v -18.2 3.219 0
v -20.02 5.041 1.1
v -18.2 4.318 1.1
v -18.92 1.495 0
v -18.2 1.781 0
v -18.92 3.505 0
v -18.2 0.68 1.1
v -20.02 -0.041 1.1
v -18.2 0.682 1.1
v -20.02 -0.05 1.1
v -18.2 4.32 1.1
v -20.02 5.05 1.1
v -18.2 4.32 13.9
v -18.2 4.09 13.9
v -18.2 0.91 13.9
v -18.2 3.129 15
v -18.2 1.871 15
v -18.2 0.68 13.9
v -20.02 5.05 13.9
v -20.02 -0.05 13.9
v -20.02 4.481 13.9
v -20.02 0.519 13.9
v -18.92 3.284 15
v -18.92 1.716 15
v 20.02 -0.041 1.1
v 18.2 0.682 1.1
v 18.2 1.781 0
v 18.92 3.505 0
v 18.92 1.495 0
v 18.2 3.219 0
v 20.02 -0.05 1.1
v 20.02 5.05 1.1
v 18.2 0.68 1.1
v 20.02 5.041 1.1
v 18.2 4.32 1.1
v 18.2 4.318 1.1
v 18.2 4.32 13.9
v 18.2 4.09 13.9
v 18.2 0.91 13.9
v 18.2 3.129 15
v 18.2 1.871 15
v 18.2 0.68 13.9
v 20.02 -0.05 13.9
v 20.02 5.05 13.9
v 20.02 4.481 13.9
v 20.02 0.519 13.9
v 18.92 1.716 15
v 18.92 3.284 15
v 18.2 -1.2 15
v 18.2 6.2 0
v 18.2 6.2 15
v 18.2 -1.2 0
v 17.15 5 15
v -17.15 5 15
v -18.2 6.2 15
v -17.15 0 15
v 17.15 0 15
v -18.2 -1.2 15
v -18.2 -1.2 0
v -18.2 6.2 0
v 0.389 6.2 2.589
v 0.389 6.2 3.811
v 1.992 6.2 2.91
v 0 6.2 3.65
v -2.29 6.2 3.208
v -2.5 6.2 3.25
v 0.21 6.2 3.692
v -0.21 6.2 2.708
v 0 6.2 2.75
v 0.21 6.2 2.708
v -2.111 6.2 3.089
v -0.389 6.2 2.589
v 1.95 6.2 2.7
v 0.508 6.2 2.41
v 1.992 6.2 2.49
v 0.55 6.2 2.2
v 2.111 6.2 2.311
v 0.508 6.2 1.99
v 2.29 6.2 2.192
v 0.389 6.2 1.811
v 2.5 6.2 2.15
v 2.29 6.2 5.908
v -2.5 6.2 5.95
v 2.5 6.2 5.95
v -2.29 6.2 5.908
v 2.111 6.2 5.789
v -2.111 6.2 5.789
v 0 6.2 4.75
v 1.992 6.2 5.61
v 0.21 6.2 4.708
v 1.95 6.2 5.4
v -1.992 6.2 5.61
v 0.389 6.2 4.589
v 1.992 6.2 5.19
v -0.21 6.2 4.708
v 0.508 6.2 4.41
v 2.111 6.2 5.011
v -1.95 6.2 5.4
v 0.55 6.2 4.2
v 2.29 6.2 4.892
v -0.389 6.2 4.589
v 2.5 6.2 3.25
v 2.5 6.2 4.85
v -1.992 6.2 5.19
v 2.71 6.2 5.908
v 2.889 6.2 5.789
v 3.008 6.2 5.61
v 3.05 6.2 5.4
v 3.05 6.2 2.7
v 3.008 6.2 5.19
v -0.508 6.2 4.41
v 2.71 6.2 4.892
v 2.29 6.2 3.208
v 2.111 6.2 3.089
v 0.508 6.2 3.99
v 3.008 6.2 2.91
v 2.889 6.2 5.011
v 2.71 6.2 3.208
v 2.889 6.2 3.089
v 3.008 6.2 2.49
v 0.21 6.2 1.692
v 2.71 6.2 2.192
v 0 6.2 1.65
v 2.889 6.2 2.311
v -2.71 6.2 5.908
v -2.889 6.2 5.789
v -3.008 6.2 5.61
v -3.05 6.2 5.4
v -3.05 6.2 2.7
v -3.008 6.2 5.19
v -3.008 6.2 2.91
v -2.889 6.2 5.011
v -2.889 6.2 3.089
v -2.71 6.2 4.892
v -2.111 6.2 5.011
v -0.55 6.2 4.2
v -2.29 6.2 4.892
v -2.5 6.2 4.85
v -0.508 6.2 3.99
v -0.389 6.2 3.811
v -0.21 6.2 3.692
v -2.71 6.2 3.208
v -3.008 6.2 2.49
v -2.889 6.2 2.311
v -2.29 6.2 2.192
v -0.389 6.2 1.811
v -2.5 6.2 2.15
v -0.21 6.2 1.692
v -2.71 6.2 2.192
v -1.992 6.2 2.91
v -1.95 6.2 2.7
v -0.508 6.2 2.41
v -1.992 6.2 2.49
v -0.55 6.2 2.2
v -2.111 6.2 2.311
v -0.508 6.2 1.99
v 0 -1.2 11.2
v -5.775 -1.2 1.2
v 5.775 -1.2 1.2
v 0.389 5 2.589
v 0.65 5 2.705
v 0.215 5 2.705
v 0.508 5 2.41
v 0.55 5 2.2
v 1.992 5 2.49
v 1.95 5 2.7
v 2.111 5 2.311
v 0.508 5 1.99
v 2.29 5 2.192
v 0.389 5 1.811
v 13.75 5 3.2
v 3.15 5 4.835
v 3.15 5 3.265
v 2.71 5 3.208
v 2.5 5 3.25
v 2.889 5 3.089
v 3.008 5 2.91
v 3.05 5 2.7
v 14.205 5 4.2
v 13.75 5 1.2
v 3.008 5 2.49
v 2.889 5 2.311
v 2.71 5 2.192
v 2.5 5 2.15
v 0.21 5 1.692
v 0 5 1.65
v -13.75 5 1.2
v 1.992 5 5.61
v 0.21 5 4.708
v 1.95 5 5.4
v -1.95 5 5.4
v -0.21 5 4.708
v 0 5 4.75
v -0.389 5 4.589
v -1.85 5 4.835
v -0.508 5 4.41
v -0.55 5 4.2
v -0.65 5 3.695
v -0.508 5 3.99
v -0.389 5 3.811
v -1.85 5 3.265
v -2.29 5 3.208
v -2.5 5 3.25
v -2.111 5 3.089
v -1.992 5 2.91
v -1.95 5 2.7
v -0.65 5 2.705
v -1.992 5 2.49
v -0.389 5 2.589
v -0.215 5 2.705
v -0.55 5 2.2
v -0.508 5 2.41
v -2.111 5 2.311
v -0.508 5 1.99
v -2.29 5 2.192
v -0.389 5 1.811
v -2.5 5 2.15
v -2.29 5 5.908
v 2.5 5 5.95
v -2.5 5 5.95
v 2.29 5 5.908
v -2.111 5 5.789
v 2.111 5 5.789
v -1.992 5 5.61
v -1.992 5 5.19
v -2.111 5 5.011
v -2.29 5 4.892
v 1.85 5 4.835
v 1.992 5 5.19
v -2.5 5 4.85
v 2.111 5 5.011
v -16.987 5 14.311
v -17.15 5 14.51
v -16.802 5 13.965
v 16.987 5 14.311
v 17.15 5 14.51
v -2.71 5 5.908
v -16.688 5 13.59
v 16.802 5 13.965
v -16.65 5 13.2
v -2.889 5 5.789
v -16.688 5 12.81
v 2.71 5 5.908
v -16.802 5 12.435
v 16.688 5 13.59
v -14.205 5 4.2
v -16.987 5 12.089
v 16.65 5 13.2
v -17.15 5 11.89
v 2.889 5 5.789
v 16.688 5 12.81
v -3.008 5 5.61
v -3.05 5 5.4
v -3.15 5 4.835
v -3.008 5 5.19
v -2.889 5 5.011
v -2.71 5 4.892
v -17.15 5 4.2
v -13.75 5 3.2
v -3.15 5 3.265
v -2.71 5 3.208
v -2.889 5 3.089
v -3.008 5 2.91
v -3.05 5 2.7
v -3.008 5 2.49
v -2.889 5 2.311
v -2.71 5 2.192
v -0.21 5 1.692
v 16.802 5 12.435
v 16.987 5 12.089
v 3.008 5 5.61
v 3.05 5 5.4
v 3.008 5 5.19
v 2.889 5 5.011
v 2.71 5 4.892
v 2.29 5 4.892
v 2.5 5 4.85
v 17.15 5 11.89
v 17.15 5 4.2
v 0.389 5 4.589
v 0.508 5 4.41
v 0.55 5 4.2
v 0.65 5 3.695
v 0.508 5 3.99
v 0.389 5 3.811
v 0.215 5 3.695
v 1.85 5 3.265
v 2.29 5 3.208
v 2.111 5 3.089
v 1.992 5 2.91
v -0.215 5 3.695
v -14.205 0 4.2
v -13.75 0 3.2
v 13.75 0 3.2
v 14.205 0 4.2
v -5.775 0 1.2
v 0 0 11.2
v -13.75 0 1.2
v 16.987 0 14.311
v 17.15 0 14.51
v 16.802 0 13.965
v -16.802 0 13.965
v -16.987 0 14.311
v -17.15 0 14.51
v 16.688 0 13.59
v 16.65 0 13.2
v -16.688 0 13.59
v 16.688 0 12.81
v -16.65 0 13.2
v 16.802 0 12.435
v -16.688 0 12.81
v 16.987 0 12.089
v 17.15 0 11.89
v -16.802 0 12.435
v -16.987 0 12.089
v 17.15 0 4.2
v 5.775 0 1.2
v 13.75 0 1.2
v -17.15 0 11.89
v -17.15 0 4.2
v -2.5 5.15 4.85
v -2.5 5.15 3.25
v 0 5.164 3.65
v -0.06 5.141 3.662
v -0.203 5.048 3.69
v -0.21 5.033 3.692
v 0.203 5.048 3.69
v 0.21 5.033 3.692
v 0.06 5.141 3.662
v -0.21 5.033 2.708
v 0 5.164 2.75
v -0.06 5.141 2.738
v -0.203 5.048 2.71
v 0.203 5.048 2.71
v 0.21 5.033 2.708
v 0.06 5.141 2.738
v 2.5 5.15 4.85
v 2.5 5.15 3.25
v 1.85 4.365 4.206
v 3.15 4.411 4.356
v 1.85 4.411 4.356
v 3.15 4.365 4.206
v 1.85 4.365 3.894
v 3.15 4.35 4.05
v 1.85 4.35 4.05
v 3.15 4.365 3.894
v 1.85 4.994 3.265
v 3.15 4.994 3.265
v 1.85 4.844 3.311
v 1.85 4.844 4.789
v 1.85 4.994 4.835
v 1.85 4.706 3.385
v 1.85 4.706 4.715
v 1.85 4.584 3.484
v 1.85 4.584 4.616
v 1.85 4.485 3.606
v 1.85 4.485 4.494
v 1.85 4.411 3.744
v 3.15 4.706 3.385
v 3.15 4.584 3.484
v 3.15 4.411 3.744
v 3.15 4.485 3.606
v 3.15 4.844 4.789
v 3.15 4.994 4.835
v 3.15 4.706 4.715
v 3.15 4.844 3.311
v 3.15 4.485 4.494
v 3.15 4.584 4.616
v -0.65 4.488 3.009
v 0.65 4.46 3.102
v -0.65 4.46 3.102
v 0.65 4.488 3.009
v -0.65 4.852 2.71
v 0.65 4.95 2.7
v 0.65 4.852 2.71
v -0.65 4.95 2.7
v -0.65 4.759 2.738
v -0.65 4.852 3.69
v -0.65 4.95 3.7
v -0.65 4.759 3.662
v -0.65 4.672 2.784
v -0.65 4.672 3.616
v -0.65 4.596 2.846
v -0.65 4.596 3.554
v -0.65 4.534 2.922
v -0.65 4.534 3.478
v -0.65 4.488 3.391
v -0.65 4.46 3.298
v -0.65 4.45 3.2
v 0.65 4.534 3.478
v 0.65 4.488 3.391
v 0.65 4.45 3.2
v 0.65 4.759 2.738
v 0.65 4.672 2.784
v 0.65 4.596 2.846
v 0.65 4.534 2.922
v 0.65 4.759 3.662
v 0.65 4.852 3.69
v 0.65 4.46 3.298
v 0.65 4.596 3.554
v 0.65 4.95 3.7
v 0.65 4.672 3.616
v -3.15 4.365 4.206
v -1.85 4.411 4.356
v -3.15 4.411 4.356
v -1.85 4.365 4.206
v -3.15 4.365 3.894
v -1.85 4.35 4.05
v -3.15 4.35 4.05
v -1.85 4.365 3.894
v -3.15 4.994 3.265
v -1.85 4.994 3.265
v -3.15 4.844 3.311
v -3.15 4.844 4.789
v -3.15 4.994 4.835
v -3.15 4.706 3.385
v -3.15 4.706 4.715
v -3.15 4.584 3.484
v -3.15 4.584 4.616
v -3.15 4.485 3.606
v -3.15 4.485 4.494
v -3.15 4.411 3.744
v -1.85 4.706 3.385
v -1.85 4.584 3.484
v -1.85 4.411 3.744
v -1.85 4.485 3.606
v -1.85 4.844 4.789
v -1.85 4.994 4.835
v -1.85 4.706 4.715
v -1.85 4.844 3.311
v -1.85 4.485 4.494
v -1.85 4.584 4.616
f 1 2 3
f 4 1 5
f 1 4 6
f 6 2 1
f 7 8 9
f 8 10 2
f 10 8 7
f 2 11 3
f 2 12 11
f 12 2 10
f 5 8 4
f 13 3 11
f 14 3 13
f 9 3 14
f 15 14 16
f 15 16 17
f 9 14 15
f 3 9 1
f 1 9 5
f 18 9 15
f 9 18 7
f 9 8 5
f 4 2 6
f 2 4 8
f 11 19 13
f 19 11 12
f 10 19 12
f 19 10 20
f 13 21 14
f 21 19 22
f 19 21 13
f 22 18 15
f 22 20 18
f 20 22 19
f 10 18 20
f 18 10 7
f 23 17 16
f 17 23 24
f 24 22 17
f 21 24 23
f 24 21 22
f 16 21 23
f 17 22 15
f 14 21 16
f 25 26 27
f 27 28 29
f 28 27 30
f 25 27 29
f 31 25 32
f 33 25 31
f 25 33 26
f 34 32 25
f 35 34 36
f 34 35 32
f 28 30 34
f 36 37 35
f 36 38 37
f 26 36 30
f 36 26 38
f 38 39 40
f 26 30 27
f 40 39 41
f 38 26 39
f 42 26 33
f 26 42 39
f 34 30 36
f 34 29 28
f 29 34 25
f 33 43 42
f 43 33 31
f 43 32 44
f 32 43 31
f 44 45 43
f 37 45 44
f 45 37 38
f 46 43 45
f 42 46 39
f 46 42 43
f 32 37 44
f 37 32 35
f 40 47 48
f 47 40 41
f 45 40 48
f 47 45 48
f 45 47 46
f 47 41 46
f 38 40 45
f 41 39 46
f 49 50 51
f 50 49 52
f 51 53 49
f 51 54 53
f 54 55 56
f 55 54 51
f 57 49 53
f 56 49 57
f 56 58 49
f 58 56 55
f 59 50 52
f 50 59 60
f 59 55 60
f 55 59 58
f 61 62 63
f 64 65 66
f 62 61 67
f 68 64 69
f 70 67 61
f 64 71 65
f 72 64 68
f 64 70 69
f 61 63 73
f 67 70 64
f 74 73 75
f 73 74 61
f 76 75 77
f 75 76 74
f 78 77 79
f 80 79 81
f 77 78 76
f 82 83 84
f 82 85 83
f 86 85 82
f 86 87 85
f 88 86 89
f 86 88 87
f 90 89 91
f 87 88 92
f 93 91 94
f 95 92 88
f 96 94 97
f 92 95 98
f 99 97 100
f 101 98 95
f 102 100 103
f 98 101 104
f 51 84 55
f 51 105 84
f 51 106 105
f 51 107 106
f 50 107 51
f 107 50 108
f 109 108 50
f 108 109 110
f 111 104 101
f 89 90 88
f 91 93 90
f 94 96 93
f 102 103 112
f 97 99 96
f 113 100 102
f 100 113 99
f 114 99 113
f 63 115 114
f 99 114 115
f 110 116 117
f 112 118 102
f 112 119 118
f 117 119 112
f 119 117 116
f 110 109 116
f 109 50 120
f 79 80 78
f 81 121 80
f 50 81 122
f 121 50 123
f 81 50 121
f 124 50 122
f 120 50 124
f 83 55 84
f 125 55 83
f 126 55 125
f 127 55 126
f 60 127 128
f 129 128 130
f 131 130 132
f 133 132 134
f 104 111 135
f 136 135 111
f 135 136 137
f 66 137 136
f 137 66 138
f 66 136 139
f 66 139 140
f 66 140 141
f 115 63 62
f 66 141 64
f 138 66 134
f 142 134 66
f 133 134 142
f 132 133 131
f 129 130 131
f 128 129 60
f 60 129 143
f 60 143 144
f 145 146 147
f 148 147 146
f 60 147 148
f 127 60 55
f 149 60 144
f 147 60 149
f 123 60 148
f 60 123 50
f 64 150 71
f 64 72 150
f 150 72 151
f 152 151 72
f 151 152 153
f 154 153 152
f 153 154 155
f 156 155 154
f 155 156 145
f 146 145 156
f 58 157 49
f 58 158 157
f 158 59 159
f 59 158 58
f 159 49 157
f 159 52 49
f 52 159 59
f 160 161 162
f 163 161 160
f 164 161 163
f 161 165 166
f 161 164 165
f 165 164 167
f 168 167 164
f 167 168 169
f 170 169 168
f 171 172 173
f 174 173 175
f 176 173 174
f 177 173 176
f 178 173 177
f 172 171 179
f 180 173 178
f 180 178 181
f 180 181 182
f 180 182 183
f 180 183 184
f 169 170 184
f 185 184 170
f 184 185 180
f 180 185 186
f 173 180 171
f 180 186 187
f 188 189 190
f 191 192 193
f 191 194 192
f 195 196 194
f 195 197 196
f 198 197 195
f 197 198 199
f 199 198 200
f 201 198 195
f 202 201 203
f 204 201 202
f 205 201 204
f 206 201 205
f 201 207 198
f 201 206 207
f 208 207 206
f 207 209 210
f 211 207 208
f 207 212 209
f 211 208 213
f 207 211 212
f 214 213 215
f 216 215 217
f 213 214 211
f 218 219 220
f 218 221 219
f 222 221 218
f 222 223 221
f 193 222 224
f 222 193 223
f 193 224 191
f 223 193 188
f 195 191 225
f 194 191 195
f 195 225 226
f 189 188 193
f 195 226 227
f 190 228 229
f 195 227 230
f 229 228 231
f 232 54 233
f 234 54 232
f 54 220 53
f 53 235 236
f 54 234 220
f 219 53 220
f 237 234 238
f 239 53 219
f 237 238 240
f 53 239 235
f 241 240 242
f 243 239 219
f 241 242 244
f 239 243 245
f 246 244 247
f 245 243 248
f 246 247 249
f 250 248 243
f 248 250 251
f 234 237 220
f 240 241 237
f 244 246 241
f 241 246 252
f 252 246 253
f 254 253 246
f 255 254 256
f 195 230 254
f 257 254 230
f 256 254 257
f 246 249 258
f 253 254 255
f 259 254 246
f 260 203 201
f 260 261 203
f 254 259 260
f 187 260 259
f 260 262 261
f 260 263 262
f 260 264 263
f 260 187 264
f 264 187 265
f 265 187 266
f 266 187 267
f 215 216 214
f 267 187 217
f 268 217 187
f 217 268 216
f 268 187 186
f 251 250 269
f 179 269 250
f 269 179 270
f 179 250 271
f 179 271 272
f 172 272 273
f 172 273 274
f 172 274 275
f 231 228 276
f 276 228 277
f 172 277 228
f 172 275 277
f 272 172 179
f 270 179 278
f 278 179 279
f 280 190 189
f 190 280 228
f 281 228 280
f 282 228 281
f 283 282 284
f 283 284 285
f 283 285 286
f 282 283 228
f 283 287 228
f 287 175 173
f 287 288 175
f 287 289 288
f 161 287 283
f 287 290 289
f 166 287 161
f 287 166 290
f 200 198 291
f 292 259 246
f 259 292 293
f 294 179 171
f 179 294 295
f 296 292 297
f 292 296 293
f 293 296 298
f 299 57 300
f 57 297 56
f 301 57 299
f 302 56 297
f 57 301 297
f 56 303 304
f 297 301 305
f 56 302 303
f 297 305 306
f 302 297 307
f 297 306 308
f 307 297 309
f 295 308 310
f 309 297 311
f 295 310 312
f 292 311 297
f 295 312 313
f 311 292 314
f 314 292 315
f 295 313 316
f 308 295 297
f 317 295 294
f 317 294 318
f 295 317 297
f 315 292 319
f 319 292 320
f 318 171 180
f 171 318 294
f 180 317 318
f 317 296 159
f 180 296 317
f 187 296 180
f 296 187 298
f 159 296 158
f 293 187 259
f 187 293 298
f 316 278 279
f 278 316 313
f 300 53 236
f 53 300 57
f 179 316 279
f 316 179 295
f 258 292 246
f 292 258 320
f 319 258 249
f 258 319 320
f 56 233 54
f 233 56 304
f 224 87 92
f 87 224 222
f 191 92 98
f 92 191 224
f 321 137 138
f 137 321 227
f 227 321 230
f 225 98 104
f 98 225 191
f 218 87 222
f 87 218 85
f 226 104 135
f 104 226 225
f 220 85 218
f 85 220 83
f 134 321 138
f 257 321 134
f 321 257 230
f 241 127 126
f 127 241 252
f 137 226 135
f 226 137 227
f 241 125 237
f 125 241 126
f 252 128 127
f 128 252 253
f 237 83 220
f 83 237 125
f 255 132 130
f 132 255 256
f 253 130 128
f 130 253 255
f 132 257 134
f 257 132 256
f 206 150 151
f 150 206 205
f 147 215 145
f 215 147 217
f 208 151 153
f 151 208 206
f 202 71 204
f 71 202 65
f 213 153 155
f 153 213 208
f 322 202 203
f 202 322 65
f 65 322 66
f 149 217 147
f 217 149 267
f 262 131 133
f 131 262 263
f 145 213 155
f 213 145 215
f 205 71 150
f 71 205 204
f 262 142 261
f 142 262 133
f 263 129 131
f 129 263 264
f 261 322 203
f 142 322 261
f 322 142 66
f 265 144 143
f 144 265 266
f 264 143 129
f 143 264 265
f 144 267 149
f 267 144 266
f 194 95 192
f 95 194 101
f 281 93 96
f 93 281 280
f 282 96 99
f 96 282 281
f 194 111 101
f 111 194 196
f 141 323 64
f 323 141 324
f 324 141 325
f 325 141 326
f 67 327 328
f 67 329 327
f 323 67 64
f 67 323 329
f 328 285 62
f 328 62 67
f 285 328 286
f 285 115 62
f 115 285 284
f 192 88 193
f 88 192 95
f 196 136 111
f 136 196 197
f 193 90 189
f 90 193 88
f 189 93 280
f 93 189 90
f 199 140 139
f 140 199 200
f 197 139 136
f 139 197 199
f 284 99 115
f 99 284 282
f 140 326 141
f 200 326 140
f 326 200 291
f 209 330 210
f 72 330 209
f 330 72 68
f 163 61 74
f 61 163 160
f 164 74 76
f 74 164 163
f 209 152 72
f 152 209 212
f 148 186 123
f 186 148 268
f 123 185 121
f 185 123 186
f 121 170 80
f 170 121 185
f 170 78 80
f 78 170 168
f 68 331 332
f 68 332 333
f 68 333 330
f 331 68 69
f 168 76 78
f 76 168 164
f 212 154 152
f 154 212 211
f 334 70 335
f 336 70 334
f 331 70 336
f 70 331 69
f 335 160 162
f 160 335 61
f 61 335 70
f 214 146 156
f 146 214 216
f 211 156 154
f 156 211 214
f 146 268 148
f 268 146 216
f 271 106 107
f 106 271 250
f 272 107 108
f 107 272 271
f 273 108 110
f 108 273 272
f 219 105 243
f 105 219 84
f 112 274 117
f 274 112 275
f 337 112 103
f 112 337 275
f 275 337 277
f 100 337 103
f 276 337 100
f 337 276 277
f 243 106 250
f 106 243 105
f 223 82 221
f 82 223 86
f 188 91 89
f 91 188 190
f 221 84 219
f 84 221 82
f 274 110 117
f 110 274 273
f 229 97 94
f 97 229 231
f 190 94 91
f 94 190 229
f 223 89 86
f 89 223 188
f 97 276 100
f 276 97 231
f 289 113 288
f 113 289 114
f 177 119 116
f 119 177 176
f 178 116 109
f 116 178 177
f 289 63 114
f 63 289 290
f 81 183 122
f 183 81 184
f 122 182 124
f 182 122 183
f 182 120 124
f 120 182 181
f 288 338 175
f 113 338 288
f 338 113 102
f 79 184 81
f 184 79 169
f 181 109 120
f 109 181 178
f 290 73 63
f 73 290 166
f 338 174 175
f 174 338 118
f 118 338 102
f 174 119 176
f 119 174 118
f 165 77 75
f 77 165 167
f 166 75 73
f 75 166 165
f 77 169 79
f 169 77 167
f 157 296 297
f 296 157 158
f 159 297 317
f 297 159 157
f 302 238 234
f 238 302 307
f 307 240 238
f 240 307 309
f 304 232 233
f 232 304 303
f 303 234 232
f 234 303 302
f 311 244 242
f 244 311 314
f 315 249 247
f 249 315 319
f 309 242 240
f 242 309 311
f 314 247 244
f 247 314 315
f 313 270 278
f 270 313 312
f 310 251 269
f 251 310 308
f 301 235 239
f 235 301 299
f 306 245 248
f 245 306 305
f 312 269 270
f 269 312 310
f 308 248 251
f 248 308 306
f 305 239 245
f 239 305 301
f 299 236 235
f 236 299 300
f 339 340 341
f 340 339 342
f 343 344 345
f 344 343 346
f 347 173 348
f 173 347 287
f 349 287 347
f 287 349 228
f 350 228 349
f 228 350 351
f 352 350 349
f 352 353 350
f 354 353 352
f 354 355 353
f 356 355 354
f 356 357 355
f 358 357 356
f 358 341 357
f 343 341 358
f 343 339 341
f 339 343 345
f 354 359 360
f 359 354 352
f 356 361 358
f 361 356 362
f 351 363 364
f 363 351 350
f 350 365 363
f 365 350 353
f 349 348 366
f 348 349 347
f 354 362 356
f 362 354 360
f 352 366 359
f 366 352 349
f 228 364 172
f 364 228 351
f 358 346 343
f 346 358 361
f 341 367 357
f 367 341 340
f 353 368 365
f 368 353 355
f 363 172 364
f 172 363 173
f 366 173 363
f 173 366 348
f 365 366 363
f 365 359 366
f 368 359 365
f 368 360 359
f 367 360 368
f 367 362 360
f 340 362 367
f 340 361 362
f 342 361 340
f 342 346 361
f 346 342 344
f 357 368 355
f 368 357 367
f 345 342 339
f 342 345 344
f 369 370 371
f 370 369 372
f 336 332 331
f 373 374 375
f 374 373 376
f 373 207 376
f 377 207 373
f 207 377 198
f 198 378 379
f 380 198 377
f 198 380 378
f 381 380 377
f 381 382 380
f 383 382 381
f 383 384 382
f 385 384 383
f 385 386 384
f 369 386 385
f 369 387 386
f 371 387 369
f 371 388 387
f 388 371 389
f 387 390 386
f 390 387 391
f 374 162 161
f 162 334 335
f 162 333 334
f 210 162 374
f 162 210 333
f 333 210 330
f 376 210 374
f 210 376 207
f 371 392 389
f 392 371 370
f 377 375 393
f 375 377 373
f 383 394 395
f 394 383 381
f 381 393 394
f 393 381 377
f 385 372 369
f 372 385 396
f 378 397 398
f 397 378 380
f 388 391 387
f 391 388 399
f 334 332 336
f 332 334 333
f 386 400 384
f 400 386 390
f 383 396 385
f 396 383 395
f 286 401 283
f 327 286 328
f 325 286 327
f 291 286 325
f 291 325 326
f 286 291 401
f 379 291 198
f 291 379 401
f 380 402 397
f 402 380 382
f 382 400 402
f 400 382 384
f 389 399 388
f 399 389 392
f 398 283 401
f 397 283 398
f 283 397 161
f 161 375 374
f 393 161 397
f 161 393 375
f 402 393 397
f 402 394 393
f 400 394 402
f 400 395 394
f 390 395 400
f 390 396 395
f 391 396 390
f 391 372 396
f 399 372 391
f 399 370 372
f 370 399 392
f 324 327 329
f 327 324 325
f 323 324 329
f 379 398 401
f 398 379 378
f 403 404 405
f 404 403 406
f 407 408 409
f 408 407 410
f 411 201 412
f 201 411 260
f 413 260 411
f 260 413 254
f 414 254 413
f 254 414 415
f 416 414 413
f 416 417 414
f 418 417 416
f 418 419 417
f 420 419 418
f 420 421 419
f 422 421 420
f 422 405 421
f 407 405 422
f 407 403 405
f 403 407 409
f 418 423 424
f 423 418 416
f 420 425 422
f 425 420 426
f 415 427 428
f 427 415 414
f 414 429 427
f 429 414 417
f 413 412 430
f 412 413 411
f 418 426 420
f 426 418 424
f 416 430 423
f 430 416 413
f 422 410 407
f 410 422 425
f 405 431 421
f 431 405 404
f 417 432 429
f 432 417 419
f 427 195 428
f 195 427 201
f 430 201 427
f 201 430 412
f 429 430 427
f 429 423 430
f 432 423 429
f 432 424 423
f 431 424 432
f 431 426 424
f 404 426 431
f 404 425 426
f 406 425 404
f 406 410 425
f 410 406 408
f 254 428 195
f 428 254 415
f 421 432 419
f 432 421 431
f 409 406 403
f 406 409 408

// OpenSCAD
// file: am_dovetail.scad
// some simple but versatile thin-walled storage boxes
//
//
// Background:
//   - CAD manual: http://www.openscad.org/documentation.html
//   - possibility to attach to parts from raspi_RJ45fix.scad
//
// Andreas Merz 2020-01-04, v0.1 
// GPLv3 or later, see http://www.gnu.org/licenses





//-------------------------------
// dovetail
//
//       w2
//    ---------
//    \       /  h
//     ---+---
//       w1
//-------------------------------

// Main dimensions
dt_w1=4;              // nominal size
dt_w2=6;
dt_h=2; 
dt_grid=dt_w1+dt_w2;  // 10 mm
dt_c=0.18;            // lateral clearance / spiel in mm


// 2D shapes

module dt_shapeNominal(h=dt_h, w1=dt_w1, w2=dt_w2, c=0) {
             hh=h-c;
	     y2=w2/2*hh/h-c;   // keep slope angle, even if c is not 0;
	     y1=w1/2-c;
             polygon(points=[[-y1,0],[y1,0],[y2,hh],[-y2,hh]]);
}

module dt_shapeMajor() {
  dt_shapeNominal(c=-dt_c);
}

module dt_shapeMinor() {
  dt_shapeNominal(c=dt_c);
}

module re_shapeNominal(h=dt_h, w1=5/3, w2=dt_w2, c=0) {
             polygon(points=[[-w1/2+c,0],[w1/2-c,0],[w2/2-c,h],[-w2/2+c,h]]);
}

// 3D shapes

module dovetail3D(h=20, s=45, t=0.8) {
         c=0.3;   // clearance / spiel in mm
         difference() { 
           linear_extrude(height=h)
              union() {
                dt_shapeMinor();
                translate([-dt_h+c,-t]) square([dt_w1-2*c,t]);

              }
           rotate([s,0,0]) translate([-4,0,-4]) cube([8, 4, 4]);
         }
 }


module am_lead_in(h=20, t=1.1, sub=0) {
}



// Dovetail to be attached to another body

module am_dovetailAdd(h=20, t=1.1, sub=0) {
    //t:  transition region
    cc=dt_c/2;
    sy=(dt_h-dt_c)/(dt_h-dt_c-t);
    union () {
      translate([0,0,0])
	linear_extrude(height=t, scale=sy)
          dt_shapeNominal(w1=(2*dt_w1-dt_c)/2/sy*0.93, w2=(2*dt_w2-dt_c)/2/sy*0.86, h=dt_h-t-dt_c, c=0);
          //dt_shapeNominal(w1=(2*dt_w1-dt_c)/2/sy*1.16, w2=(2*dt_w2-dt_c)/2/sy*1.27, h=dt_h-t, c=dt_c);
      translate([0,0,t])
	linear_extrude(height=h-2*t, scale=1)
	  dt_shapeNominal(c=dt_c);
      translate([0,0,h]) mirror([0,0,1])
        linear_extrude(height=t, scale=sy) 
          dt_shapeNominal(w1=(dt_w1+cc)/sy, w2=(dt_w2+cc)/sy, h=dt_h-t, c=dt_c);
    }
}


// Dovetail to be carved out of another body

module am_dovetailSub(h=20, t=0.8) {
    //t:  transition region
    sy=dt_h/(dt_h+t);
    cc=+dt_c/2;
    union () {
      translate([0,0,0])
	linear_extrude(height=t, scale=sy)
          dt_shapeNominal(w1=(dt_w1+cc)/sy, w2=(dt_w2+cc)/(sy), h=dt_h+t, c=-dt_c);
      translate([0,0,t])
	linear_extrude(height=h-2*t, scale=1)
	  dt_shapeNominal(c=-dt_c);
      translate([0,0,h]) mirror([0,0,1])
        linear_extrude(height=t, scale=sy) 
          dt_shapeNominal(w1=(dt_w1+cc)/sy, w2=(dt_w2+cc)/(sy), h=dt_h+t, c=-dt_c);
    }
}



//------------- Instances --------------------

am_dovetailAdd();
// main file
// Halterung fuer 610mAh flat LiPo Handy-Akkus von Infineon
// 
// 
// Background:
//   - repository: https://github.com/Github6am/am_parts3D
//   - CAD manual: http://www.openscad.org/documentation.html
//
// Andreas Merz 2020-01-04, v0.1 
// GPLv3 or later, see http://www.gnu.org/licenses


// import dovetail and mounting plate definitions
use <am_dovetail.scad>


// Main battery dimensions
xaa1=27.2;     // Weite am Sockel
xaa2=34;       // max Weite
yaa1=4.5;      // Dicke am Sockel
zaa1=15;       // height

wall=1.2;      // wall thickness
cax=0.3;       // clearance x
cay=0.5;       // clearance y

Yaa1=yaa1+2*wall+cay;  // outer y-Dimension


// inner shape
module battery_shapeI() {
    c=0.1;
    cx=cax;   // Toleranz in x-Richtung
    cy=cay;
    sx=(xaa1+cx+1)/(xaa1+cx);   // Fase an der Stufe
    difference() {
      union() {
	 translate([0,(yaa1+cy)/2,2+wall]) linear_extrude(height=1+c, scale=[sx,1]) 
	                                   square([xaa1+cx, yaa1+cy], center=true);
	 translate([-(xaa1+cx)/2,0,0+wall]) cube([xaa1+cx, yaa1+cy, 2+c]);
	 translate([-(xaa2+cx)/2,0,3+wall]) cube([xaa2+cx, yaa1+cy, zaa1]);
	 // bore holes
	 translate([-2.5,yaa1/2,4.2+wall]) rotate([90,0,0]) cylinder(d=1.1,h=13, $fn=16, center=true);
	 translate([-2.5,yaa1/2,1.5+wall]) rotate([90,0,0]) cylinder(d=1.1,h=13, $fn=16, center=true);
	 translate([ 0.0,yaa1/2,3.0+wall]) rotate([90,0,0]) cylinder(d=1.1,h=13, $fn=16, center=true);
	 translate([ 0.0,yaa1/2,1.0+wall]) rotate([90,0,0]) cylinder(d=1.1,h=13, $fn=16, center=true);
	 translate([+2.5,yaa1/2,4.2+wall]) rotate([90,0,0]) cylinder(d=1.1,h=13, $fn=16, center=true);
	 translate([+2.5,yaa1/2,1.5+wall]) rotate([90,0,0]) cylinder(d=1.1,h=13, $fn=16, center=true);
	 
	 // experimental: snapper
	 //translate([-(xaa2+c+2.5)/2,     0+c,12+wall]) rotate([90,0,0]) cylinder(r=3,h=7, $fn=32, center=false);
	 //translate([-(xaa2+c+2.5)/2,yaa1+7+cay,12+wall]) rotate([90,0,0]) cylinder(r=3,h=7, $fn=32, center=false);
	 
	 // triangle hole to simplify contact mounting
	 translate([0,-yaa1/2+1,wall]) linear_extrude(height=10,scale=[0,1]) square([11.55,3], center=true);

      }
      union() {
         // Vorsprung
	 translate([-(xaa2+cx+3.0)/2,yaa1/2,12+wall]) rotate([90,0,0]) cylinder(r=2,h=yaa1+1+c, $fn=32, center=true);
	 translate([+(xaa2+cx+3.0)/2,yaa1/2,12+wall]) rotate([90,0,0]) cylinder(r=2,h=yaa1+1+c, $fn=32, center=true);

         // contact support
	 translate([+2.5, cy+yaa1/2+2.4, 2.85+wall]) rotate([0,90,0]) cylinder(r=0.8,h=1.3, $fn=32, center=true);
	 translate([ 0.0, cy+yaa1/2+2.2, 2.0 +wall]) rotate([0,90,0]) cylinder(r=0.5,h=1.3, $fn=32, center=true);
	 translate([-2.5, cy+yaa1/2+2.4, 2.85+wall]) rotate([0,90,0]) cylinder(r=0.8,h=1.3, $fn=32, center=true);
      }
    }
}

// outer shape
module battery_shapeO() {
    c=cay;
    union() {
       translate([-(xaa2+2*wall)/2, -wall,0]) cube([xaa2+2*wall, Yaa1, zaa1]);
       translate([-(xaa2+2*wall)/2, (c+yaa1)/2,0]) rotate([0,0, 90]) am_dovetailAdd(h=zaa1);
       translate([+(xaa2+2*wall)/2, (c+yaa1)/2,0]) rotate([0,0,-90]) am_dovetailAdd(h=zaa1);
    }
}

module battery_holder1() {
    c=cay;
    difference() {
      battery_shapeO();
      battery_shapeI();
    }
}

module battery_holder2() {
    union() {
      battery_holder1();
        
    }
}

//------------- Instances --------------------

//battery_shapeI();
battery_holder1();
